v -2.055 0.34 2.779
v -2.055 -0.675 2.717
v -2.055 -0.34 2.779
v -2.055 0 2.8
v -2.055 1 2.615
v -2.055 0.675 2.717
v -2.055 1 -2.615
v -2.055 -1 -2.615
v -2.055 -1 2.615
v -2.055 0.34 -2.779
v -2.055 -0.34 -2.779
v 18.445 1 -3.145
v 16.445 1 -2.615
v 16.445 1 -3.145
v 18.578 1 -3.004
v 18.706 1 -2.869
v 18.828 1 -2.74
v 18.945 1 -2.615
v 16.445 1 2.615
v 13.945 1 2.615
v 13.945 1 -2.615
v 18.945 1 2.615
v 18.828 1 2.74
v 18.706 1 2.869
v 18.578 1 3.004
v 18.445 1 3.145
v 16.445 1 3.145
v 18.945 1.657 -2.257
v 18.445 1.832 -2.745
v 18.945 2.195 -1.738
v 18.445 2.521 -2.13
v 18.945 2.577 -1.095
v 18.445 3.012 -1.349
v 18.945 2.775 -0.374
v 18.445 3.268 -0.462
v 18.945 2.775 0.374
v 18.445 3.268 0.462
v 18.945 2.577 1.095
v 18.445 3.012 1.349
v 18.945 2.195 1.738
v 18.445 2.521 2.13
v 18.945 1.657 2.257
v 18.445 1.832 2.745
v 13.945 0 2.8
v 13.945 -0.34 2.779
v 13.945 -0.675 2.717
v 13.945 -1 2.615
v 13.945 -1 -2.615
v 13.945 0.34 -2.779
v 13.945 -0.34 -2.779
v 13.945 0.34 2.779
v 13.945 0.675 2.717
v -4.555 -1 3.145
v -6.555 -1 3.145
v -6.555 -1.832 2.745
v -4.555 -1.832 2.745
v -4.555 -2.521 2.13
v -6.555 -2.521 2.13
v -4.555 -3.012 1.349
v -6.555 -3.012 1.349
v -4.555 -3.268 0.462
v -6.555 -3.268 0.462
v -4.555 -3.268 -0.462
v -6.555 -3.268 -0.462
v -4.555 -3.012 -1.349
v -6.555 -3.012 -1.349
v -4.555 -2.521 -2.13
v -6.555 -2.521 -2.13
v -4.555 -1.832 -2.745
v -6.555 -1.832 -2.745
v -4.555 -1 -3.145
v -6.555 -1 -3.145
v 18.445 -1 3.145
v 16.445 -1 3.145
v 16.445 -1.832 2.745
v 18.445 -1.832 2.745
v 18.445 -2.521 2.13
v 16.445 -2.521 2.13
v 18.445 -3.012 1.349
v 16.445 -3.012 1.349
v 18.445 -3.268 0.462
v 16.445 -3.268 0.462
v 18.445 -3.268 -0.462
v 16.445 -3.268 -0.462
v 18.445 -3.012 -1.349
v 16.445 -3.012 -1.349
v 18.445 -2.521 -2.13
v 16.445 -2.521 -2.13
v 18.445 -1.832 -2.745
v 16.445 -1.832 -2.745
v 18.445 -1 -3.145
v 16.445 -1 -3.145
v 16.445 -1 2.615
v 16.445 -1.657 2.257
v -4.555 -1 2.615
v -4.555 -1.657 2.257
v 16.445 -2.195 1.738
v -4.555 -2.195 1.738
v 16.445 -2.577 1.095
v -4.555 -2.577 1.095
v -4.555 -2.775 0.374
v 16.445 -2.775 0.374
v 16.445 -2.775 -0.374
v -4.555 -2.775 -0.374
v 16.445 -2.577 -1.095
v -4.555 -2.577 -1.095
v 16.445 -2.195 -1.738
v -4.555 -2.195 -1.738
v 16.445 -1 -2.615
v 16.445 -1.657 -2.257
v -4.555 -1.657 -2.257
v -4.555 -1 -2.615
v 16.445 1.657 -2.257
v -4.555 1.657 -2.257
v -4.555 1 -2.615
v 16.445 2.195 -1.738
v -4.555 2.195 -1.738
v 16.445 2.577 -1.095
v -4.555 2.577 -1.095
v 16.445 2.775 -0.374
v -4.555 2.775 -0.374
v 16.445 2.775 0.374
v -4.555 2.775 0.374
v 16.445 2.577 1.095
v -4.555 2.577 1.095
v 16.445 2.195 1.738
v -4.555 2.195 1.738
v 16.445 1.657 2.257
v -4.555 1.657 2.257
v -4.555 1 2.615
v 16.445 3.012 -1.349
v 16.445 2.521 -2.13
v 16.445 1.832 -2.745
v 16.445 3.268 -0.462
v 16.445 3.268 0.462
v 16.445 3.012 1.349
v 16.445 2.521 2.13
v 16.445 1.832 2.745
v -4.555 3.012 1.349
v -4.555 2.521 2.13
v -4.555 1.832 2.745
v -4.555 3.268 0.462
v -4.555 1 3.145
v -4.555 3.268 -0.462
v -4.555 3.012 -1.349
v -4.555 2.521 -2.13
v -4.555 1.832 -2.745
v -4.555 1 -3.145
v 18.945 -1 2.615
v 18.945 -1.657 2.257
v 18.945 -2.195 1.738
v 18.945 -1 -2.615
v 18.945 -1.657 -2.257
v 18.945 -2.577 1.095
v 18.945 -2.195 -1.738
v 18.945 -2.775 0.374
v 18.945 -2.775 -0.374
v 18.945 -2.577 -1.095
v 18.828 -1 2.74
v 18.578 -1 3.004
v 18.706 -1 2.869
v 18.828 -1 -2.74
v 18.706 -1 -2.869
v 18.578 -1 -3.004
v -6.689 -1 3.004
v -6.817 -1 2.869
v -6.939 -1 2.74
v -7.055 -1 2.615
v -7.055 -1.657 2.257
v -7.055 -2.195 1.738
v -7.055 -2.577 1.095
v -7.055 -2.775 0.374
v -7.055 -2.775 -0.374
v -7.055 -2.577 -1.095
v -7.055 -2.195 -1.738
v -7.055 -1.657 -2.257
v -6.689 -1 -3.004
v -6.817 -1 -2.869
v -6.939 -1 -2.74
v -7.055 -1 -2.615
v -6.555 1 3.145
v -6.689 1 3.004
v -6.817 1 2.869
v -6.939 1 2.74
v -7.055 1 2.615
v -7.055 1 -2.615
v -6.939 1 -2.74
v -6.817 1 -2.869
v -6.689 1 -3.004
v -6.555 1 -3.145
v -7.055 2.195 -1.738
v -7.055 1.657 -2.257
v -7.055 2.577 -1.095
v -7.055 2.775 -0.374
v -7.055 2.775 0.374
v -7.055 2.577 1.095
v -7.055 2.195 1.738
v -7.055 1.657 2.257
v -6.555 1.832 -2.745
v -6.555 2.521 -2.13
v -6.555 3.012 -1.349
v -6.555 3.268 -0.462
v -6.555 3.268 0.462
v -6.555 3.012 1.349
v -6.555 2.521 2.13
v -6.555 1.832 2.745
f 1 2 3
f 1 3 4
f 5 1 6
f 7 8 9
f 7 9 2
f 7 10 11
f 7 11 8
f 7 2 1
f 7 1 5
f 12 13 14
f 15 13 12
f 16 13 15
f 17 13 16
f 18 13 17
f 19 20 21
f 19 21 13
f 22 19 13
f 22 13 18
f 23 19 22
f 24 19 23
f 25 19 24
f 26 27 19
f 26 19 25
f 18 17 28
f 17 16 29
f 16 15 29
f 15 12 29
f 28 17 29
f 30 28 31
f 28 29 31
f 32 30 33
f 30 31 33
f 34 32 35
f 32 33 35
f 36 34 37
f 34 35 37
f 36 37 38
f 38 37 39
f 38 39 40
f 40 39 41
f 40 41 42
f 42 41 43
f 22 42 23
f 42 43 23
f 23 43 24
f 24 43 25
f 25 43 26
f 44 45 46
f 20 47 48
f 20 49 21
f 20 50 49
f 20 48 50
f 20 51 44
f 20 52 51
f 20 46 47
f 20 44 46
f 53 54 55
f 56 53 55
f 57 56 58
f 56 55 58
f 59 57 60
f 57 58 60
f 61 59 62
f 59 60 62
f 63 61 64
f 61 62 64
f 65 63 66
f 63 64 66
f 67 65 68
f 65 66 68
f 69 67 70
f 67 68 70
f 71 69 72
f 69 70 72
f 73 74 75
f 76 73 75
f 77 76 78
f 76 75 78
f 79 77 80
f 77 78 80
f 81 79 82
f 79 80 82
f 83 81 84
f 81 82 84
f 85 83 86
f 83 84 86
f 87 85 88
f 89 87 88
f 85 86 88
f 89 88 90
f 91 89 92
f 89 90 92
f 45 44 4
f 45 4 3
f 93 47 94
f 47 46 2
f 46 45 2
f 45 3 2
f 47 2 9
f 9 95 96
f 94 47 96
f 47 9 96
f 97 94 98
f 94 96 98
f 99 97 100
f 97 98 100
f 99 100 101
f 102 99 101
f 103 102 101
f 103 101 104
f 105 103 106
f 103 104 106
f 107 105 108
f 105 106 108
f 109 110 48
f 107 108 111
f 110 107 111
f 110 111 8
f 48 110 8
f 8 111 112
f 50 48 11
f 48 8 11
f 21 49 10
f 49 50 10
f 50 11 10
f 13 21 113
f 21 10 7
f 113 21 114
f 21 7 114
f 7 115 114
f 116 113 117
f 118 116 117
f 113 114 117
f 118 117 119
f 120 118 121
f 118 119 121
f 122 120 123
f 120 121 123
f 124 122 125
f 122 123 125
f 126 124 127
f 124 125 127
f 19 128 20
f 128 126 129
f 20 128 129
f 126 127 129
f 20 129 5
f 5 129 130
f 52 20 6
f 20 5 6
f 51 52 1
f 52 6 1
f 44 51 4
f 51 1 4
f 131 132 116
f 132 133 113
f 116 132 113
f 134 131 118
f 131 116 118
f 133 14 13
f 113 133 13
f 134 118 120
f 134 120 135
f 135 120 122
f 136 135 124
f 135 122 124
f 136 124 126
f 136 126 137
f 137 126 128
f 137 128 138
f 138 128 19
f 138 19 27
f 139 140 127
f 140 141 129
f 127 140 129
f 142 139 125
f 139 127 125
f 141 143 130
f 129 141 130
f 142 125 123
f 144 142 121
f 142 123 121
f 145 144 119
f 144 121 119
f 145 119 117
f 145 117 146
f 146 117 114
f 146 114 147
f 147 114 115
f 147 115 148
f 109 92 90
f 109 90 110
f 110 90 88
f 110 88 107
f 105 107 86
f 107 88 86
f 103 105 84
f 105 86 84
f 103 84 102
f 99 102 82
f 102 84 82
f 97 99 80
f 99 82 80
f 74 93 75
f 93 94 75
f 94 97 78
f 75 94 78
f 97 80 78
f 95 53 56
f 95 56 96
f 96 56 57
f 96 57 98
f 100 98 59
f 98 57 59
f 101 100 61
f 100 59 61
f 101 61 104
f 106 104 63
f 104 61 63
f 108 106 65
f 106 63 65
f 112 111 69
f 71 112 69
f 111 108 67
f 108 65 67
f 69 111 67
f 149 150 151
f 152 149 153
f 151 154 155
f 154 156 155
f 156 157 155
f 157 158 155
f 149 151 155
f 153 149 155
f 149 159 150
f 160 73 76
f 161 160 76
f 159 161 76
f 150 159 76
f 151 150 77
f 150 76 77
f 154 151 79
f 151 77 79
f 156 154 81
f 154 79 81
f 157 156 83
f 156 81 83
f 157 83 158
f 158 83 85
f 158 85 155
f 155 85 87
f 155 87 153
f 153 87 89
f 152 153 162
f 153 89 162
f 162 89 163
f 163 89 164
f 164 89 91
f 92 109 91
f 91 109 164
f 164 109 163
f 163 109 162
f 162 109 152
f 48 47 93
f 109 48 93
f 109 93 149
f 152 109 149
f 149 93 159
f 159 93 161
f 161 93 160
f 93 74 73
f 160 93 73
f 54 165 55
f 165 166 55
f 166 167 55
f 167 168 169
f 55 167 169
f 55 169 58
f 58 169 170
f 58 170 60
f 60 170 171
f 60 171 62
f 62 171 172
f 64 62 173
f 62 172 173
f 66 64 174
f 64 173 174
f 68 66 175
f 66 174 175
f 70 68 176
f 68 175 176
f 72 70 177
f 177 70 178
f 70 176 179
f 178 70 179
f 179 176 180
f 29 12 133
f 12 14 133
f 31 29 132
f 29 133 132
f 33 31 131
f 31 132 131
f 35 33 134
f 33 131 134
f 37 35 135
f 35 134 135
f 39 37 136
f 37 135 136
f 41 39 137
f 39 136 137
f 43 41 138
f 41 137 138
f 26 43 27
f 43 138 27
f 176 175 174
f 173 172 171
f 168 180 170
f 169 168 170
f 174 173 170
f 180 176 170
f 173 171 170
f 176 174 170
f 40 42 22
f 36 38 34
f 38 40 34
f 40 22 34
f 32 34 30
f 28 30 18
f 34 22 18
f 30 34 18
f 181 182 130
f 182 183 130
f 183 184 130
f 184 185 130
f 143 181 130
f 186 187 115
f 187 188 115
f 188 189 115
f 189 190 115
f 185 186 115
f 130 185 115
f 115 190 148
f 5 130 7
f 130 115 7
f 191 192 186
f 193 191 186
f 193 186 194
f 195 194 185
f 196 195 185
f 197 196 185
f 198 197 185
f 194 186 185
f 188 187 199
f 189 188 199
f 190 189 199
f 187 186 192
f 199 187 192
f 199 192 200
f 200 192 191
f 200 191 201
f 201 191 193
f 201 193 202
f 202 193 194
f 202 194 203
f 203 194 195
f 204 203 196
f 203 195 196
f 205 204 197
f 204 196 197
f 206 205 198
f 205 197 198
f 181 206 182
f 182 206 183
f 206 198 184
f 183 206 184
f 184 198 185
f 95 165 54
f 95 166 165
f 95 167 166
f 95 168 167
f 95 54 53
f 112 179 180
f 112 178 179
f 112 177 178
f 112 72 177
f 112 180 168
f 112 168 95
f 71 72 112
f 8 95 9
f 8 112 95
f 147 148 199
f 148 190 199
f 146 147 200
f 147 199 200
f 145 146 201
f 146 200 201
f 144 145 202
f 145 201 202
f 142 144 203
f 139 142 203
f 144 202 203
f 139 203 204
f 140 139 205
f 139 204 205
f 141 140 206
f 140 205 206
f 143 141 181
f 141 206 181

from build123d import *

# Parameters (mm, degrees)
F2_W     = 6.671602
F2_H     = 2
F2_W_2   = 14.827402
F3_DEPTH = 12.5


with BuildPart() as f1:
    # F0 (on Front) → F1 (revolve)
    with BuildSketch(Plane.XZ):
        Polygon((-7.055335, 2.8), (-7.055335, 0), (18.944665, 0), (18.944665, 2.8), (18.444665, 3.3), (16.444665, 3.3), (16.444665, 2.8), (-4.555335, 2.8), (-4.555335, 3.3), (-6.555335, 3.3), align=None)
    revolve(axis=Axis((5.944665, 0, 0), (1, 0, 0)))

    # F2 (on Top) → F3 (cut, symmetric)
    with BuildSketch(Plane.XY):
        with Locations((-5.391136, 0)):
            Rectangle(F2_W, F2_H)
        with Locations((21.358366, 0)):
            Rectangle(F2_W_2, F2_H)
    extrude(amount=F3_DEPTH, both=True, mode=Mode.SUBTRACT)


solid = f1.part
